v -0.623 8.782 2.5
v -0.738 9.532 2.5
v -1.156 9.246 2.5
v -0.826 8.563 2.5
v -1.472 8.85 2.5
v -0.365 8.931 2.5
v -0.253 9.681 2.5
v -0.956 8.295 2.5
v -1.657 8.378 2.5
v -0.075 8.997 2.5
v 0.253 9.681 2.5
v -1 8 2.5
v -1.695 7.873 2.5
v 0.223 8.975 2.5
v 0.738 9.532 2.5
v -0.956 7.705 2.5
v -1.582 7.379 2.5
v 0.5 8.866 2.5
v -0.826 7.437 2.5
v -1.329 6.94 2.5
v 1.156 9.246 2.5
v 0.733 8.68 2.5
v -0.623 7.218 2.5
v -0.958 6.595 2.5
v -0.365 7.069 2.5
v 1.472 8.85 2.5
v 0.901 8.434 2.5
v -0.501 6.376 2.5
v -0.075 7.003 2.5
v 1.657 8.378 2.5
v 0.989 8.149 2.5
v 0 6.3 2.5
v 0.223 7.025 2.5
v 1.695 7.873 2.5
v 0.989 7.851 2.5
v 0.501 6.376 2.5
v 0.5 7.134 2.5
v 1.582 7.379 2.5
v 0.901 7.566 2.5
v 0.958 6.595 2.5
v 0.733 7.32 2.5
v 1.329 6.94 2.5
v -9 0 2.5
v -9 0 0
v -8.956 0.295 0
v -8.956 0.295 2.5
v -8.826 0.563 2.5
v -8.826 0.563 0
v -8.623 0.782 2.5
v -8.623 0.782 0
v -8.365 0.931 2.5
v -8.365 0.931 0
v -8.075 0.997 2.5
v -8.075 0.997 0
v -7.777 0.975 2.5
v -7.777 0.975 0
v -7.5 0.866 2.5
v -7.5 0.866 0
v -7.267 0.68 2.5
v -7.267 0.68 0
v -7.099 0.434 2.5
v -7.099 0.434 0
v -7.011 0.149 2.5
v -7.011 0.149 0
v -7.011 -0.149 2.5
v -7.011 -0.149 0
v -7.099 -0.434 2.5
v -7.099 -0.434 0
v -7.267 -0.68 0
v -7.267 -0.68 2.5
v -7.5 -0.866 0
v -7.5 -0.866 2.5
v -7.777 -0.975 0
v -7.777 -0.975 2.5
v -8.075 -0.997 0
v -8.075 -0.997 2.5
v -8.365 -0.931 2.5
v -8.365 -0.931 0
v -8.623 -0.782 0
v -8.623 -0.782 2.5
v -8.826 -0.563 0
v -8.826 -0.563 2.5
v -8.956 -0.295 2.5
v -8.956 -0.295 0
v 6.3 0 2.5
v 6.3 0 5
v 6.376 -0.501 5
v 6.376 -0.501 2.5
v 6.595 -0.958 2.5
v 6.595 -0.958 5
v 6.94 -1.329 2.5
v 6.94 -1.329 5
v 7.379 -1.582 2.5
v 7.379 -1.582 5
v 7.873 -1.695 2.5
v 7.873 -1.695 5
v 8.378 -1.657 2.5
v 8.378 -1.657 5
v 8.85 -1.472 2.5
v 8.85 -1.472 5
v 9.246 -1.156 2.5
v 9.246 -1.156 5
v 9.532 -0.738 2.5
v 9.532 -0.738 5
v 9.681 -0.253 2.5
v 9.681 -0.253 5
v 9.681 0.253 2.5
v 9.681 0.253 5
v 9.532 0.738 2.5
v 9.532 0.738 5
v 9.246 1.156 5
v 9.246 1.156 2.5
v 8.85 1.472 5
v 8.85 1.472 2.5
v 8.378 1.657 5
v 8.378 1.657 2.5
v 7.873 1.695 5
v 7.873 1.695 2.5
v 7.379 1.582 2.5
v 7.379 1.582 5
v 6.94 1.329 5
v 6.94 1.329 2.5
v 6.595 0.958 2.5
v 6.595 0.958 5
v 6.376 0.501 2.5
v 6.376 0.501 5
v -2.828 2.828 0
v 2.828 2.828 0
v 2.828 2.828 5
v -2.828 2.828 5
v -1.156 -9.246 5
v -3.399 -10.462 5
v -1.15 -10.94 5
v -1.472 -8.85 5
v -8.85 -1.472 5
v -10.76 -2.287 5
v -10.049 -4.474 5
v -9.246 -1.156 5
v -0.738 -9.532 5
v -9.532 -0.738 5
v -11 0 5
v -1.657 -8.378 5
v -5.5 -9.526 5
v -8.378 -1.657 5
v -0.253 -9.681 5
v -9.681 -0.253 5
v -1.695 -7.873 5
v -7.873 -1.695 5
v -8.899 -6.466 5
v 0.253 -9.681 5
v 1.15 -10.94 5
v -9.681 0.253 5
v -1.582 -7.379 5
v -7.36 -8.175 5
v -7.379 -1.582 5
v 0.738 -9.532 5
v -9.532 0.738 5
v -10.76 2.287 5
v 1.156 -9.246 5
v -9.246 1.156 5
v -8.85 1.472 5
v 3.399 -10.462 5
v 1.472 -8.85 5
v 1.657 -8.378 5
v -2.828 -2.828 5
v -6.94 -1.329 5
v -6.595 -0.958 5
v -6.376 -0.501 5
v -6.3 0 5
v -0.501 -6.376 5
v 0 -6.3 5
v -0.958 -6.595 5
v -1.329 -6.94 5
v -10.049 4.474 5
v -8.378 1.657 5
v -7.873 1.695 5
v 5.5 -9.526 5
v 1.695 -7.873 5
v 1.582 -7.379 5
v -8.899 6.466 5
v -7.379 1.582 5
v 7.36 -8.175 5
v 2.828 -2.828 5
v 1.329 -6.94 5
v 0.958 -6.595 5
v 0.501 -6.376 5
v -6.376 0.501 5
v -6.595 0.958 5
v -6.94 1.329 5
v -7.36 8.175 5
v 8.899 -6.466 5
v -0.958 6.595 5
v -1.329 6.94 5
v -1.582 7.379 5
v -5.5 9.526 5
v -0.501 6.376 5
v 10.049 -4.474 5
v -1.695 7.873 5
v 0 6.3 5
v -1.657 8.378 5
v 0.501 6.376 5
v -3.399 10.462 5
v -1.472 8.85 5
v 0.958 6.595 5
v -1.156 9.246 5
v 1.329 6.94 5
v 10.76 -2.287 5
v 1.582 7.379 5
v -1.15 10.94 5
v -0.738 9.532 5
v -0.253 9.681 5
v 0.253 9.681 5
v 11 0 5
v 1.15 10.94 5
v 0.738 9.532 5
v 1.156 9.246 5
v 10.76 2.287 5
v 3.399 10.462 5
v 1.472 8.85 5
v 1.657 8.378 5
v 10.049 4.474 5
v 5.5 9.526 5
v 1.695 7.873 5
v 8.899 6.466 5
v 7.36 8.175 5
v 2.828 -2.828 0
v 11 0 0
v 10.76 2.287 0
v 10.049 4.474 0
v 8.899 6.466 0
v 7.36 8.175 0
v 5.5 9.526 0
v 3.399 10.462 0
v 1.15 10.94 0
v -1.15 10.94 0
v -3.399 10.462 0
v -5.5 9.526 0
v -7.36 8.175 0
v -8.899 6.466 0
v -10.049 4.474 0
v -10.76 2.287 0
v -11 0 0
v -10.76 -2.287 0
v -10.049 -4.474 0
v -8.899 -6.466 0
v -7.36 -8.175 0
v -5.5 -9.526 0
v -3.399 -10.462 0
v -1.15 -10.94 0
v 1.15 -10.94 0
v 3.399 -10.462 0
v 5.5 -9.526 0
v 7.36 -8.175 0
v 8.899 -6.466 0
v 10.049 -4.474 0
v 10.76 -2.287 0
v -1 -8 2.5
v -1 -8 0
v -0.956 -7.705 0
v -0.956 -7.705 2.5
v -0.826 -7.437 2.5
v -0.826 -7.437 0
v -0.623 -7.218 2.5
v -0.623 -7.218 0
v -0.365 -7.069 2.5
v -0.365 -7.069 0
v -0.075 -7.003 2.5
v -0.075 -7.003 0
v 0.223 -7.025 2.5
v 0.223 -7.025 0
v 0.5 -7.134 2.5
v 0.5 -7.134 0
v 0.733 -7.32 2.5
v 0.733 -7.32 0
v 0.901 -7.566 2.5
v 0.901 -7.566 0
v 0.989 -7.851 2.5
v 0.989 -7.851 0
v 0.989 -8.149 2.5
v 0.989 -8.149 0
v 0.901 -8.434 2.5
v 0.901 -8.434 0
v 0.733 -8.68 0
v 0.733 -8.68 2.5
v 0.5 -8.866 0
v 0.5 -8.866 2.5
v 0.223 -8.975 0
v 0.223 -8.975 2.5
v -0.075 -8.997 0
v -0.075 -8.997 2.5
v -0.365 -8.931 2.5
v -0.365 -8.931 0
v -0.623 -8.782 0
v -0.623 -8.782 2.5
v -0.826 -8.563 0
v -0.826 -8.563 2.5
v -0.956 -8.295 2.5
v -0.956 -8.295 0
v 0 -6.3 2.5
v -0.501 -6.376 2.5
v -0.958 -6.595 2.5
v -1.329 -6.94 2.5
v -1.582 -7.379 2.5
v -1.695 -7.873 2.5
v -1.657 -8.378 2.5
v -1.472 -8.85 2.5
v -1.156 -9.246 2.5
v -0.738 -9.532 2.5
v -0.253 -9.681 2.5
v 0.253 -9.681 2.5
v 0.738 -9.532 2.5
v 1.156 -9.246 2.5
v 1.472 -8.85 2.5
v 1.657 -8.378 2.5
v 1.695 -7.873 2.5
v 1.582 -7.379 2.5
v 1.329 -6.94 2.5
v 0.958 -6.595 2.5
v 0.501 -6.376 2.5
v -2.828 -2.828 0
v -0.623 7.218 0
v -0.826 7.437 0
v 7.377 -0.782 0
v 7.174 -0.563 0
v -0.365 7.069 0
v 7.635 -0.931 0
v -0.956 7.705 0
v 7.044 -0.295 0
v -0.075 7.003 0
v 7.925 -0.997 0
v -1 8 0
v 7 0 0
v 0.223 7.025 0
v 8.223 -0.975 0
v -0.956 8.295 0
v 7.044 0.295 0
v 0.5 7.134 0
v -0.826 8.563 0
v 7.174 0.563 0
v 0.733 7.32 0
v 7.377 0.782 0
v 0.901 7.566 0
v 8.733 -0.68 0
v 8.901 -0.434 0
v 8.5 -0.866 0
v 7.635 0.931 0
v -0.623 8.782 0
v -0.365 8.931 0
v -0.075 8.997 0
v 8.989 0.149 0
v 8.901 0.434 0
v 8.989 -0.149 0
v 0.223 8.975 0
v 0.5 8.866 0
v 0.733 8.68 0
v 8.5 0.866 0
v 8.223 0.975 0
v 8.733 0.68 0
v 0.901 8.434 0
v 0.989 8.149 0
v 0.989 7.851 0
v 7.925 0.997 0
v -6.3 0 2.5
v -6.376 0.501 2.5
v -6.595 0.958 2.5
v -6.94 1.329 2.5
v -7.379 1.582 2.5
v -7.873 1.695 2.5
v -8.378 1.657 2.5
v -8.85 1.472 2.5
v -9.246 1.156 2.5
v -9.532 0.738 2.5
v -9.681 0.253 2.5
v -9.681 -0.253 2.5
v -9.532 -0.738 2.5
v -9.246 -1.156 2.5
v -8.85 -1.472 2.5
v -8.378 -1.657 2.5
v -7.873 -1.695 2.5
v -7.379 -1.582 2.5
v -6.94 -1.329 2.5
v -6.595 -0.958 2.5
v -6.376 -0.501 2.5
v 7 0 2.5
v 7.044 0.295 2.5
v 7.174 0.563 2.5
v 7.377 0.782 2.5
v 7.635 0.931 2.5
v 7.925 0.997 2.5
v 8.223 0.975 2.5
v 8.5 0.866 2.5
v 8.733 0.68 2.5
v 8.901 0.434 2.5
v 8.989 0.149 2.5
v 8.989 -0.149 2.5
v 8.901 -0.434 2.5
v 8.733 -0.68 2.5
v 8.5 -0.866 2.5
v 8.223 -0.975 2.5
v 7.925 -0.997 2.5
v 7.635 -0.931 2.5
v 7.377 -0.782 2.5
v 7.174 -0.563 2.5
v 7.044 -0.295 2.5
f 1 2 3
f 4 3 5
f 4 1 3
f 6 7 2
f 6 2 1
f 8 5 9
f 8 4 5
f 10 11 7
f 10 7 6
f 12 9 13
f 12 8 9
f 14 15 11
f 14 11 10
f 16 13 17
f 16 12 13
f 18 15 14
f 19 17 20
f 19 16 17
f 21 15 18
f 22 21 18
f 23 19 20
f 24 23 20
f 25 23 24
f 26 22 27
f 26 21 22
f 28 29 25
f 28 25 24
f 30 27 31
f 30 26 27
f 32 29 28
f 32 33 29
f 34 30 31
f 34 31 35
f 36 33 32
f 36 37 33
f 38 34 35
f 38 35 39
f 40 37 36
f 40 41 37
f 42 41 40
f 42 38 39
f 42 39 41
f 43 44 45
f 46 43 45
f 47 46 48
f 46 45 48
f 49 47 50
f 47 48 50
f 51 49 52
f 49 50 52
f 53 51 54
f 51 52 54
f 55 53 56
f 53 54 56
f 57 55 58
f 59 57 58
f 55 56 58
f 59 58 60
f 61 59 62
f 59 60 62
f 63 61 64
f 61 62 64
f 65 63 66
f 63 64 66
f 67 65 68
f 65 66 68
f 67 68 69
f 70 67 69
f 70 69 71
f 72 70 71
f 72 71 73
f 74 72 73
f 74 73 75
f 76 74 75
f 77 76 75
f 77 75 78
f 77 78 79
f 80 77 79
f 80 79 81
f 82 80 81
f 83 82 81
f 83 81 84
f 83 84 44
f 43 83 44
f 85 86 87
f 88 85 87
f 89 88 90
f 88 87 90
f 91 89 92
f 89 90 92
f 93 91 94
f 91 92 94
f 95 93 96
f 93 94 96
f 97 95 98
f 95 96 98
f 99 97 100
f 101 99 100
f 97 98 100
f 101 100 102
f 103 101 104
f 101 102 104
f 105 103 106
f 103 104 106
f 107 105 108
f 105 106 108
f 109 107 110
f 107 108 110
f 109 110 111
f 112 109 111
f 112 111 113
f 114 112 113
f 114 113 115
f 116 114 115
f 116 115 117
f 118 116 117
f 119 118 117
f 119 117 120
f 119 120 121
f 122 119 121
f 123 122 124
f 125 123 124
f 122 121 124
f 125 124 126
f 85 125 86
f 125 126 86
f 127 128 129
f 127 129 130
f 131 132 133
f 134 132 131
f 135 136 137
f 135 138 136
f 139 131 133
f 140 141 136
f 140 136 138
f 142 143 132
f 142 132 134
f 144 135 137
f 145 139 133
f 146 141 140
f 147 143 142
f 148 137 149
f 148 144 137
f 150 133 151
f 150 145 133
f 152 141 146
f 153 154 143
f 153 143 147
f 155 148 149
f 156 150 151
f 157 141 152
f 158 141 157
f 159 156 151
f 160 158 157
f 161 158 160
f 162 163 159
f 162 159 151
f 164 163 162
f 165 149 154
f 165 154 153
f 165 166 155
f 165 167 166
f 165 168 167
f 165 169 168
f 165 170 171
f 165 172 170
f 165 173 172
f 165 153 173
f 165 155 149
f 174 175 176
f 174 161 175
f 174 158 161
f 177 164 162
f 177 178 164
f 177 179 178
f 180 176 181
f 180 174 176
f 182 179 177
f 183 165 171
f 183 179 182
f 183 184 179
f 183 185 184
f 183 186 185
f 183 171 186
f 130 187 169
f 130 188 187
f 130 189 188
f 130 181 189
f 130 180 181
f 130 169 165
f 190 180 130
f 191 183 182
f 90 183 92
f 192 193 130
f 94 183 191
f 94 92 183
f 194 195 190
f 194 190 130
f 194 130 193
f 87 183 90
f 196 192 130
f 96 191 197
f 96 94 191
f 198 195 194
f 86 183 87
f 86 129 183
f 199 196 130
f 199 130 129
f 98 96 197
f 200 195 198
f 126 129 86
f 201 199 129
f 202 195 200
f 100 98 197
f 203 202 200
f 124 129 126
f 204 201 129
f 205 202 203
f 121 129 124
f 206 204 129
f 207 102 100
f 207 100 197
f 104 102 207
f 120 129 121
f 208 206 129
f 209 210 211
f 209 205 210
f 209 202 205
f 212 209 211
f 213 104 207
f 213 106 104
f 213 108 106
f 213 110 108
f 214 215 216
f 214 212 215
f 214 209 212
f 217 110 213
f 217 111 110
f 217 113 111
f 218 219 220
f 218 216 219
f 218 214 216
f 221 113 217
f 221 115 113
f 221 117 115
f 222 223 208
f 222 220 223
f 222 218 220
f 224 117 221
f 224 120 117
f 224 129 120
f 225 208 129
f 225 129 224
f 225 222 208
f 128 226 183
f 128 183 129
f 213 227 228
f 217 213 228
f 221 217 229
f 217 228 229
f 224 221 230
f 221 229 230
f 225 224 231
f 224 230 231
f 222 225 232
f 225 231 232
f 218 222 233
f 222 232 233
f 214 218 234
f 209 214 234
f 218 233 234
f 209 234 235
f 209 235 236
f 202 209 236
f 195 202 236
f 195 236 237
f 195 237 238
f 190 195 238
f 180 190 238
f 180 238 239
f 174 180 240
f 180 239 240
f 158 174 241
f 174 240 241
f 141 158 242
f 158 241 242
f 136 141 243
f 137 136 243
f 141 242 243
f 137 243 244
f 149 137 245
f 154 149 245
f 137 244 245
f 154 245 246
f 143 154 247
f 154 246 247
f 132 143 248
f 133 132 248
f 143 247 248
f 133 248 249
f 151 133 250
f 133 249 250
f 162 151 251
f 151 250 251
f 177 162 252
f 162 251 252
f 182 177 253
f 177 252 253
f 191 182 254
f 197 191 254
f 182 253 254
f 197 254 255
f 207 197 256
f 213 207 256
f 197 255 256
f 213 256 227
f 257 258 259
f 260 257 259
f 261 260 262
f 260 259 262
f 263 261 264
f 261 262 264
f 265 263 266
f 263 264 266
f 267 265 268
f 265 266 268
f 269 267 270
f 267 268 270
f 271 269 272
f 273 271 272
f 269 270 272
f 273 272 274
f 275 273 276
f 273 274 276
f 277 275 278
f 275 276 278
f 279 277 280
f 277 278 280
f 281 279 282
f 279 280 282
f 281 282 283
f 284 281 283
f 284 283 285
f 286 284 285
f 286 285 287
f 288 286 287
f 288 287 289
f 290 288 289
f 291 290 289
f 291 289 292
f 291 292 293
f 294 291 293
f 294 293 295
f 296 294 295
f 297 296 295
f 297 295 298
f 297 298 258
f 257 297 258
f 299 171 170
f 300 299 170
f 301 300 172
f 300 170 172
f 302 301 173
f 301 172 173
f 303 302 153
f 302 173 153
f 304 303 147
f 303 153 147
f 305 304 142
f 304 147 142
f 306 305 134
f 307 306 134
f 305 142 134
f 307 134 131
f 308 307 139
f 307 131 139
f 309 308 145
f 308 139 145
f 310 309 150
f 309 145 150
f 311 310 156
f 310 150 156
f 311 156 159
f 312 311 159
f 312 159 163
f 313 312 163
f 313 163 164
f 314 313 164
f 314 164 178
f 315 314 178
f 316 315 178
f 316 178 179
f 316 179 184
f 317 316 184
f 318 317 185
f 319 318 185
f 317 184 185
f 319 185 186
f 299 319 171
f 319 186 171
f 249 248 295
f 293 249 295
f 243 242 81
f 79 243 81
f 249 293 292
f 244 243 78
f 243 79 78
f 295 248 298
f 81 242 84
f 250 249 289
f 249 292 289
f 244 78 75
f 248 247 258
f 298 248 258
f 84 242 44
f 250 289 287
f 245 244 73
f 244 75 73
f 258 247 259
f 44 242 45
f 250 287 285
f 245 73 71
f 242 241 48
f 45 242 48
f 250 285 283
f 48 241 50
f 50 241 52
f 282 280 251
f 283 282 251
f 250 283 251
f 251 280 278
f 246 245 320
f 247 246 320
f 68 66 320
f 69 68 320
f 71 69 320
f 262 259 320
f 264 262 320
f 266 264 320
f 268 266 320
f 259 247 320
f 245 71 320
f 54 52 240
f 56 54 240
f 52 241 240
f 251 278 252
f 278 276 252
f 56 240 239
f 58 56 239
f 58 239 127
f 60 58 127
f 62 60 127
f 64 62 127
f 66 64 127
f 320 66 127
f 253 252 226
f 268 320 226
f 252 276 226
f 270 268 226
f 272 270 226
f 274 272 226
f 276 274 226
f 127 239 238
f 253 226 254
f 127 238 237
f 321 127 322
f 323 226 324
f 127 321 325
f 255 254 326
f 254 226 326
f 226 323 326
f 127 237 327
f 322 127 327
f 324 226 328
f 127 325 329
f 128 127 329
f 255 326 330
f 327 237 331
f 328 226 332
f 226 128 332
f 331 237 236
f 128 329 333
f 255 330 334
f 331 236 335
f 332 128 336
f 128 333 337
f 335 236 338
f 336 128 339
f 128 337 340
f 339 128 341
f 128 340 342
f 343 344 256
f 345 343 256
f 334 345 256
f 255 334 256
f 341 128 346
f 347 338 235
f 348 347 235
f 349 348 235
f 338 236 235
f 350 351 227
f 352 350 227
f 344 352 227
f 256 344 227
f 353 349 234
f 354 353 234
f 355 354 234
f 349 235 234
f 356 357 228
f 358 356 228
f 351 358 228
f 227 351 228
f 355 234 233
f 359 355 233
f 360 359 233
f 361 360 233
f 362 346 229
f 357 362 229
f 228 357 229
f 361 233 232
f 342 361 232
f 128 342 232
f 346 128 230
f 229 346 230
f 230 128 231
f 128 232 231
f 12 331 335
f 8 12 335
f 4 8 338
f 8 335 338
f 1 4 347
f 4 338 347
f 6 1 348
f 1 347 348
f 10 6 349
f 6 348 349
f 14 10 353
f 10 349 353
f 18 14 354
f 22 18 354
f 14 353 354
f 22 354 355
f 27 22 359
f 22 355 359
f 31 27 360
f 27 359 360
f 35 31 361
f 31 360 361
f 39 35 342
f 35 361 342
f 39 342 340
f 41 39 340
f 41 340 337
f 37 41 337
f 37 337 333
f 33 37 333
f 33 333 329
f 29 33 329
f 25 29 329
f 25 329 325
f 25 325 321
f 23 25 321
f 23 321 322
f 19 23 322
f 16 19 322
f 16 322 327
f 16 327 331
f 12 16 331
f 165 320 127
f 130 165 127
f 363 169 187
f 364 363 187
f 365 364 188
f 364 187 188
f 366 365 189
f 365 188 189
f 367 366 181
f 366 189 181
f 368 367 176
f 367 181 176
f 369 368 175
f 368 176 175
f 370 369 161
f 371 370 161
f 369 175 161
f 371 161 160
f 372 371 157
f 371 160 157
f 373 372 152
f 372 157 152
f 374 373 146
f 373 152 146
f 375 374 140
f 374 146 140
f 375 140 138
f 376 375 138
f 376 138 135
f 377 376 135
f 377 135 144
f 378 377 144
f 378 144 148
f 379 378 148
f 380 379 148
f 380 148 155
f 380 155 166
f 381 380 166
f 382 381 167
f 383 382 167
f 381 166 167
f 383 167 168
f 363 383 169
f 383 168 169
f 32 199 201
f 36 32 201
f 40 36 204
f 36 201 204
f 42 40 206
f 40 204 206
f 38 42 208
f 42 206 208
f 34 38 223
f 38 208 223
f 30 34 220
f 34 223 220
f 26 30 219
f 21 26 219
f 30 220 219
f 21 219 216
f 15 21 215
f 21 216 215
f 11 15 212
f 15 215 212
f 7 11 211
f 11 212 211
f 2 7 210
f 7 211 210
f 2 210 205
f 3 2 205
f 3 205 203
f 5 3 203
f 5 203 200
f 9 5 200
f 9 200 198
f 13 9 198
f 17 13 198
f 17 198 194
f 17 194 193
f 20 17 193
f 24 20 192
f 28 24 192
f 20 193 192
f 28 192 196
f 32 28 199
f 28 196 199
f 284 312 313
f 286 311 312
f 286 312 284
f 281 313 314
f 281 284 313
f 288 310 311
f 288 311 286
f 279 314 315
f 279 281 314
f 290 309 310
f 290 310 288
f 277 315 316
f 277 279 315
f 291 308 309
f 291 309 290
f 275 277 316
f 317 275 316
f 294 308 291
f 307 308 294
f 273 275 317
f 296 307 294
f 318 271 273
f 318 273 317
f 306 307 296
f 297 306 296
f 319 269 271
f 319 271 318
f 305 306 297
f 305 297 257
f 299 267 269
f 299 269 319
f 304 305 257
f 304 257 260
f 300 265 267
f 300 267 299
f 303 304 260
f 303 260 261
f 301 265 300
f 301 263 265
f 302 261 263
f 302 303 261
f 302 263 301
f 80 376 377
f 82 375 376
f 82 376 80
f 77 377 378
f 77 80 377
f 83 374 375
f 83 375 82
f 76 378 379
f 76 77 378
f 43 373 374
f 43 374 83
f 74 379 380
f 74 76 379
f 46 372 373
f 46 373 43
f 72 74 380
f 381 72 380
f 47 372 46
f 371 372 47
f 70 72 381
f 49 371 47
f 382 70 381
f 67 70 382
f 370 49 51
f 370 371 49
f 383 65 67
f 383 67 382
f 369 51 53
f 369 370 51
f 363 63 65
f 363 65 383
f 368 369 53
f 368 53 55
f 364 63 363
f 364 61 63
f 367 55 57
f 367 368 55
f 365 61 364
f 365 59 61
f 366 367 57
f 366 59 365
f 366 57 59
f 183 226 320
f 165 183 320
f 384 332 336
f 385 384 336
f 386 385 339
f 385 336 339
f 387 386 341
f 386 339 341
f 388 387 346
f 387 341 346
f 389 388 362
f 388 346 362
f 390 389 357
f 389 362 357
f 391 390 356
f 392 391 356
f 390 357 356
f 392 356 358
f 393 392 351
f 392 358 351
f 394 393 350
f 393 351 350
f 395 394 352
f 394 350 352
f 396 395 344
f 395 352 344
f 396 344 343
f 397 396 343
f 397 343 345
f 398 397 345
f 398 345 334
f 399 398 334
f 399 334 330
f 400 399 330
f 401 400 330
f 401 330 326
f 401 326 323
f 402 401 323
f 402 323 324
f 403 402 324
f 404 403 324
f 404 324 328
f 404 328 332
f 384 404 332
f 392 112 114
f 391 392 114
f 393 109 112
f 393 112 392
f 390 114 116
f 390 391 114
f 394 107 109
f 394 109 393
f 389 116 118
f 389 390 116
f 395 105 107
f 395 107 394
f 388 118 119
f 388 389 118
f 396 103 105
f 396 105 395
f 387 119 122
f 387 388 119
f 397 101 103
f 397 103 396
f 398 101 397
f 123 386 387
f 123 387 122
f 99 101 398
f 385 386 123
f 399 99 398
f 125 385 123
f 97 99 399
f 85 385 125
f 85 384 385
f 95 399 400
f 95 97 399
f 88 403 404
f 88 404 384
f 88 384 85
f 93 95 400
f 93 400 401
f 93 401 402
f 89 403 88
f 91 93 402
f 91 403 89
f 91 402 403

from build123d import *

# Parameters (mm, degrees)
SKETCH1_R             = 11
SKETCH1_W             = 5.65685425
SKETCH1_H             = 5.65685425
BOSS_EXTRUDE1_DEPTH   = 5
F_2_0MM_DOWEL_HOLE1_D = 2
SKETCH4_R             = 1.7
CUT_EXTRUDE1_DEPTH    = 2.5
CIRPATTERN1_COUNT     = 4


with BuildPart() as part:
    # Sketch1 → Boss-Extrude1 (new body)
    with BuildSketch(Plane(origin=(0, 0, 0), x_dir=(0, 1, 0), z_dir=(0, 0, 1))):
        with Locations(Location((0, 0, 0), (0, 0, 270))):
            Circle(SKETCH1_R)
        Rectangle(SKETCH1_W, SKETCH1_H, mode=Mode.SUBTRACT)
    extrude(amount=BOSS_EXTRUDE1_DEPTH)

    # Ø2.0mm Dowel Hole1 (through all)
    with Locations(Plane.XY.offset(5)):
        with Locations((8, 0), (0, 8), (-8, 0), (0, -8)):
            Hole(F_2_0MM_DOWEL_HOLE1_D / 2)

    # Sketch4 → Cut-Extrude1 (cut)
    with BuildSketch(Plane.XY.offset(5)):
        with Locations((-8, 0)):
            Circle(SKETCH4_R)
    cut_extrude1 = extrude(amount=-CUT_EXTRUDE1_DEPTH, mode=Mode.SUBTRACT)

    # CirPattern1: Cut-Extrude1 ×4 about axis
    cirpattern1_axis = Axis((0, 0, 0), (0, 0, 1))
    for i in range(1, CIRPATTERN1_COUNT):
        add(cut_extrude1.rotate(cirpattern1_axis, i * 360 / CIRPATTERN1_COUNT), mode=Mode.SUBTRACT)


solid = part.part
